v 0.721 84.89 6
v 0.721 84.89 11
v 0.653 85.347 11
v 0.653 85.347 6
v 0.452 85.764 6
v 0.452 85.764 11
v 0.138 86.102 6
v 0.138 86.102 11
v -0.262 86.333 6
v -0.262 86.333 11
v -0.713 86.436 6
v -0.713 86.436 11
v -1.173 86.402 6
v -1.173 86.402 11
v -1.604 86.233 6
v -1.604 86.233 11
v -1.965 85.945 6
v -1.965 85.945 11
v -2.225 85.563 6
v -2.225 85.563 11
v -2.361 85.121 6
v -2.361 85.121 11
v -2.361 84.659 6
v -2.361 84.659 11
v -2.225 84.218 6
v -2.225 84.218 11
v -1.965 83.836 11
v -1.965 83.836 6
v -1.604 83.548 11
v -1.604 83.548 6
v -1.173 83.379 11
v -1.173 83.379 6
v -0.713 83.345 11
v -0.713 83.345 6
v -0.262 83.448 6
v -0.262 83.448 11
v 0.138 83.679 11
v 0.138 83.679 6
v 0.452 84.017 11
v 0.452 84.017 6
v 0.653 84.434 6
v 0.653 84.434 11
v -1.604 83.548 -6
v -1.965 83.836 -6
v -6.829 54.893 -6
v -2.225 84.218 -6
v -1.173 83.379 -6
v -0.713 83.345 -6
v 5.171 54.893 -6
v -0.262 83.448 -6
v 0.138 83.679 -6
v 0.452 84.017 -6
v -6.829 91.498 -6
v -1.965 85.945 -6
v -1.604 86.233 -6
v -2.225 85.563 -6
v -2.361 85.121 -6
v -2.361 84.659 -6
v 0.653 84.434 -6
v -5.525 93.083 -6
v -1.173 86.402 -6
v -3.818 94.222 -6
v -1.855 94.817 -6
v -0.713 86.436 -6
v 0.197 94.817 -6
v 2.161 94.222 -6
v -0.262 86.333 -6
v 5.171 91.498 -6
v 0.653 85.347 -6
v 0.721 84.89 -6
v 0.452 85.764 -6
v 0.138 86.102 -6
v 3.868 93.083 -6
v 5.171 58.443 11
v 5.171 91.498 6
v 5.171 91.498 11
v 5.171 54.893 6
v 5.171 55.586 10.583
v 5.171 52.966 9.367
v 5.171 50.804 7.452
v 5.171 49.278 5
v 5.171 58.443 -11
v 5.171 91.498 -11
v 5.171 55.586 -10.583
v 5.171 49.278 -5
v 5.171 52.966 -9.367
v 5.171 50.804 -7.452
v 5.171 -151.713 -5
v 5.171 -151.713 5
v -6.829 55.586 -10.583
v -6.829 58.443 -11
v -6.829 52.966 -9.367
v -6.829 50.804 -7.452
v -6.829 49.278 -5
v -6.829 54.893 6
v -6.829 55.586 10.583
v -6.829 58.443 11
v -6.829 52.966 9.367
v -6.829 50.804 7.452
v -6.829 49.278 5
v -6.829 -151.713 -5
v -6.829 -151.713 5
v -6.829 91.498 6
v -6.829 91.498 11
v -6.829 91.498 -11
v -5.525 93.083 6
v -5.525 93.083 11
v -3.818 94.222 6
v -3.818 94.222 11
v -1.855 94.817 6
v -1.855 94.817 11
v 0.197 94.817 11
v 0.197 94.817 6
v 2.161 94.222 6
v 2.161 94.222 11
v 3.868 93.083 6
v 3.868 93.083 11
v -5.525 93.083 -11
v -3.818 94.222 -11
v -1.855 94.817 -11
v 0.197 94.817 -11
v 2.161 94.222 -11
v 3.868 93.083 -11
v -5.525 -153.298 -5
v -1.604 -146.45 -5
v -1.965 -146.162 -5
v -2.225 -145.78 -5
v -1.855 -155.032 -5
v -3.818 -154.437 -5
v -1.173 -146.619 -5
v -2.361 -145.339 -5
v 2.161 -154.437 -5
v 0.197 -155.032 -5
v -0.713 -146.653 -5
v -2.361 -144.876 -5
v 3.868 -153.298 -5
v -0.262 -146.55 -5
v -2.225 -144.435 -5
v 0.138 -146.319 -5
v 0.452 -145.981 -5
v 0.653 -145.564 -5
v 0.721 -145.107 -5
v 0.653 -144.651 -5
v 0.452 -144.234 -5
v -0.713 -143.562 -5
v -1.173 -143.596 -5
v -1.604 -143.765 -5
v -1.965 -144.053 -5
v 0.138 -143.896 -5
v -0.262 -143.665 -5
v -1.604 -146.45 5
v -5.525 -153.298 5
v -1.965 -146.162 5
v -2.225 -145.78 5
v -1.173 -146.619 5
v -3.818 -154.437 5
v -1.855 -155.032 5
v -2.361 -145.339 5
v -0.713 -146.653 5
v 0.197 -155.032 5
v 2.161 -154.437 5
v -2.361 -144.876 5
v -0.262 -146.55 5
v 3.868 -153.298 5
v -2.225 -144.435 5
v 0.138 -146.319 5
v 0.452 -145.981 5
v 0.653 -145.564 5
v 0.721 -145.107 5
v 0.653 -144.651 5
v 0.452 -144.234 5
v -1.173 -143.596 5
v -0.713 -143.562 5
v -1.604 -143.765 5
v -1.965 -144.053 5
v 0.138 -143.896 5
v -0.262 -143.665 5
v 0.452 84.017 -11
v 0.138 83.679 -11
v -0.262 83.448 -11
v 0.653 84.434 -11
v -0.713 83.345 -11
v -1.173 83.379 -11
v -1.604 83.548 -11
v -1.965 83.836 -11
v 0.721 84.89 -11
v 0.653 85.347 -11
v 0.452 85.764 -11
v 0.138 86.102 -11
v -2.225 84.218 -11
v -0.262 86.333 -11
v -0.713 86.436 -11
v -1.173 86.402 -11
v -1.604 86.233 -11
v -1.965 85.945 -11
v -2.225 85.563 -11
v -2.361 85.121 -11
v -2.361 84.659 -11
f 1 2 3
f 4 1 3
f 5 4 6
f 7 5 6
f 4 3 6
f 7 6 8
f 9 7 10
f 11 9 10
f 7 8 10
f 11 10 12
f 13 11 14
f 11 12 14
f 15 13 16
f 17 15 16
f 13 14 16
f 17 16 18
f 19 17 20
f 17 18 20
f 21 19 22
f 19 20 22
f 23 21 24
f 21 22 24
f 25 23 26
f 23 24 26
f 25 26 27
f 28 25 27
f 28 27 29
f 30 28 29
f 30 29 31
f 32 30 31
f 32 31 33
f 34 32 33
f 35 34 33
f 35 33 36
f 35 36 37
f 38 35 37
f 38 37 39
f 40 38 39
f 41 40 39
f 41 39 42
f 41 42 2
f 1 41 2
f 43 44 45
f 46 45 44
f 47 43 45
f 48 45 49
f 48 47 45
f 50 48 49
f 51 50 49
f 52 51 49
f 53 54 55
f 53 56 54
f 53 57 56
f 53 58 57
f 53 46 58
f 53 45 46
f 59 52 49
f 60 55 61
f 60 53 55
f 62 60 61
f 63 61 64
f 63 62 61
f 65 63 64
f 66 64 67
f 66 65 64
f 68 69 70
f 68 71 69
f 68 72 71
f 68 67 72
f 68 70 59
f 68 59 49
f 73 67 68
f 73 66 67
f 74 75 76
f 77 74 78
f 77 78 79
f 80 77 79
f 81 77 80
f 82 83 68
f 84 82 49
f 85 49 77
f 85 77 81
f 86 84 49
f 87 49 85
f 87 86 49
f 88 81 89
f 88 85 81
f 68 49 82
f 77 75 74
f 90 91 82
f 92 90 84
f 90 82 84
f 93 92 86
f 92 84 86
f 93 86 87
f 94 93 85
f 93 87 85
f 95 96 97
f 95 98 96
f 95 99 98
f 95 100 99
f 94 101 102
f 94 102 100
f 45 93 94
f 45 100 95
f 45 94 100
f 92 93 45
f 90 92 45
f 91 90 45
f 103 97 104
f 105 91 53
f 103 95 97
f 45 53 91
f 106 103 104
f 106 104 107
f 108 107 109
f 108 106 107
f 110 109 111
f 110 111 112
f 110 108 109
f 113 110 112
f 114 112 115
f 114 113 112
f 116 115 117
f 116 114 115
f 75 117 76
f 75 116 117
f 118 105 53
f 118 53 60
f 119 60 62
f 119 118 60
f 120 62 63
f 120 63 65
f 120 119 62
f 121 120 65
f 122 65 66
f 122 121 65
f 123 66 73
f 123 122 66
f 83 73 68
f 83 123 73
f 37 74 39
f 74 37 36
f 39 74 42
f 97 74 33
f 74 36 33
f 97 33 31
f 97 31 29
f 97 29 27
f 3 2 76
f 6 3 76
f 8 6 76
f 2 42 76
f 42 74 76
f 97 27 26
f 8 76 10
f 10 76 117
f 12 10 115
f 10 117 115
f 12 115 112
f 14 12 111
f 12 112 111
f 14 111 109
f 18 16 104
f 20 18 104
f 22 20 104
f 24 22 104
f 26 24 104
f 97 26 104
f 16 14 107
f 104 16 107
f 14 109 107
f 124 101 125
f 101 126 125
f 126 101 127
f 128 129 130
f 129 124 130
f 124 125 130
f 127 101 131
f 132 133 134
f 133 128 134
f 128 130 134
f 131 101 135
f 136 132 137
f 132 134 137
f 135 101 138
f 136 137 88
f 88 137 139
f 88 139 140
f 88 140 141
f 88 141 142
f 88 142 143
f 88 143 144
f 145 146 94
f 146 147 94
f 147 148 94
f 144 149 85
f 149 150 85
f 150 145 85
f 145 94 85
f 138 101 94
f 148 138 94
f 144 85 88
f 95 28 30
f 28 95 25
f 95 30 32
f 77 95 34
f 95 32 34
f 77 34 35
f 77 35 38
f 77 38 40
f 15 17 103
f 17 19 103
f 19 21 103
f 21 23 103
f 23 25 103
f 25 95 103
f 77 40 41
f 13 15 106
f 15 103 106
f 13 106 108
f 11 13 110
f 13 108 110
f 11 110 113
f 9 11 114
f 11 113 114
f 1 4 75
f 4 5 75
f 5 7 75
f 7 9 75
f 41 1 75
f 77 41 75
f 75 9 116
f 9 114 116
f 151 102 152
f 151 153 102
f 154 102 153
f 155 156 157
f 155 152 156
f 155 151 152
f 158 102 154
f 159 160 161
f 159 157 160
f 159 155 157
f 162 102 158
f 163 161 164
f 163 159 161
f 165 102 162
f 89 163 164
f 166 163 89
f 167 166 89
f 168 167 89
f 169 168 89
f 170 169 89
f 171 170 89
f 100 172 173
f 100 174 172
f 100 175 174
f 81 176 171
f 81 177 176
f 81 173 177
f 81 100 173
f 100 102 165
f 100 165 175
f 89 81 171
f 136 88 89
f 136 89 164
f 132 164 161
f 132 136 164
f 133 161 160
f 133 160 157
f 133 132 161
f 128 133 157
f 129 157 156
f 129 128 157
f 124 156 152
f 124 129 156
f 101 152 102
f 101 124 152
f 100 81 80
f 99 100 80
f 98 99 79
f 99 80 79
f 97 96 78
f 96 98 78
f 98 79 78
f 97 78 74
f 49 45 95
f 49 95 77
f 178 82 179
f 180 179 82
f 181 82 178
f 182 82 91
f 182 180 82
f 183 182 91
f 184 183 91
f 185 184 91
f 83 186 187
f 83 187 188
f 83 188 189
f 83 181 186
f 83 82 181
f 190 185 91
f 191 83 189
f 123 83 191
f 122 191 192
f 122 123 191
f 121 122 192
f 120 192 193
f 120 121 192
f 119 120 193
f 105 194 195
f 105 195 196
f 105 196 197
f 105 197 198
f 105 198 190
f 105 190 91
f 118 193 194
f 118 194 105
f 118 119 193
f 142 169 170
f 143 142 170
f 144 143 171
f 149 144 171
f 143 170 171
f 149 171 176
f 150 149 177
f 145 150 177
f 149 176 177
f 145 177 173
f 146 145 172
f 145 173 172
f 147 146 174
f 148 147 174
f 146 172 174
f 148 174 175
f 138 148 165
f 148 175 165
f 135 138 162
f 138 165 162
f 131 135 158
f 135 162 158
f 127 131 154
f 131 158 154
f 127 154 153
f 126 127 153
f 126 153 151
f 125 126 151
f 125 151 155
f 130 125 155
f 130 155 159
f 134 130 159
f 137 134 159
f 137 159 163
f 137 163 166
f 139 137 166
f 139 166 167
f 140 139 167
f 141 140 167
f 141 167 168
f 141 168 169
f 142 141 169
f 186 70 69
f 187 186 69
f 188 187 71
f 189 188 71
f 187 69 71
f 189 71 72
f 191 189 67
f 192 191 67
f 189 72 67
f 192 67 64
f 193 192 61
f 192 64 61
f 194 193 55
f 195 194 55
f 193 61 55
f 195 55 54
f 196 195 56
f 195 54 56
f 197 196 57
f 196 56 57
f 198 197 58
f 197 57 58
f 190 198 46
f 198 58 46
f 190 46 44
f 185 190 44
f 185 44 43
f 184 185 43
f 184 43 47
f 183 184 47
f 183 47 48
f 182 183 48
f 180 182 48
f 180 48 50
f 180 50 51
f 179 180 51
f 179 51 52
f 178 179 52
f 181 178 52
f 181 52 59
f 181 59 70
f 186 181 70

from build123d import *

# Parameters (mm, degrees)
BOSS_EXTRU_1_DEPTH      = 11
BOSS_EXTRU_1_DEPTH_BACK = 11
ESQUISSE3_W             = 16.581408451
ESQUISSE3_H             = 12
ENL_V_MAT_EXTRU_2_DEPTH = 40
CUT_EXTRUDE1_REACH      = 158.809
SKETCH1_R               = 1.55
CUT_EXTRUDE2_DEPTH      = 6
FILLET1_R               = 10


with BuildPart() as part:
    # Esquisse1 → Boss.-Extru.1 (new, two sides: drawn at the far end of the back side and taken through both)
    with BuildSketch(Plane.XY.offset(-BOSS_EXTRU_1_DEPTH_BACK)):
        with BuildLine():
            Line((-6.828531952, -151.713036206), (-6.828531952, 91.498065413))
            ThreePointArc((-6.828531952, 91.498065413), (-0.828532479, 94.89251507), (5.171468048, 91.498067278))
            Line((5.171468048, 91.498067278), (5.171468048, -151.713036206))
            ThreePointArc((5.171468048, -151.713036206), (-0.828531952, -155.10748493), (-6.828531952, -151.713036206))
        make_face()
    extrude(amount=BOSS_EXTRU_1_DEPTH + BOSS_EXTRU_1_DEPTH_BACK)

    # Esquisse3 → Enlèv. mat.-Extru.2 (cut)
    with BuildSketch(Plane(origin=(0, 94.89251507, 0), x_dir=(1, 0, 0), z_dir=(0, 1, 0))):
        with Locations((0.202032035, 0)):
            Rectangle(ESQUISSE3_W, ESQUISSE3_H)
    extrude(amount=-ENL_V_MAT_EXTRU_2_DEPTH, mode=Mode.SUBTRACT)

    # Cut-Extrude1: up to this face of the body (flat: up to its plane)
    cut_extrude1_end = Plane(part.part.faces().sort_by_distance((-0.828531947, -30.10748493, -11))[0])
    # Sketch1 → Cut-Extrude1 (cut, up to the picked face)
    with BuildSketch(Plane.XY.offset(11), mode=Mode.PRIVATE) as cut_extrude1_sk1:
        with Locations((-0.828531952, 84.890414662)):
            Circle(SKETCH1_R)
    cut_extrude1_tool1 = split(extrude(cut_extrude1_sk1.sketch, amount=-CUT_EXTRUDE1_REACH, mode=Mode.PRIVATE), bisect_by=cut_extrude1_end, keep=Keep.BOTH, mode=Mode.PRIVATE)
    # Sketch1 → Cut-Extrude1 (cut, up to the picked face)
    with BuildSketch(Plane.XY.offset(11), mode=Mode.PRIVATE) as cut_extrude1_sk2:
        with Locations((-0.828531952, -145.10748493)):
            Circle(SKETCH1_R)
    cut_extrude1_tool2 = split(extrude(cut_extrude1_sk2.sketch, amount=-CUT_EXTRUDE1_REACH, mode=Mode.PRIVATE), bisect_by=cut_extrude1_end, keep=Keep.BOTH, mode=Mode.PRIVATE)
    add(cut_extrude1_tool1.solids().sort_by(Axis((-0.828532, 84.890415, 11), (0, 0, -1)))[0], mode=Mode.SUBTRACT)
    add(cut_extrude1_tool2.solids().sort_by(Axis((-0.828532, -145.107485, 11), (0, 0, -1)))[0], mode=Mode.SUBTRACT)

    # Sketch4 → Cut-Extrude2 (cut)
    with BuildSketch(Plane.XY.offset(11)):
        with BuildLine():
            Line((-6.828531952, 49.278330566), (-6.828531952, -151.713036206))
            ThreePointArc((-6.828531952, -151.713036206), (-0.828531952, -157.713036206), (5.171468048, -151.713036206))
            Line((5.171468048, -151.713036206), (5.171468048, 49.278330566))
            Line((5.171468048, 49.278330566), (-6.828531952, 49.278330566))
        make_face()
    cut_extrude2 = extrude(amount=-CUT_EXTRUDE2_DEPTH, mode=Mode.SUBTRACT)

    # Mirror1: Cut-Extrude2 across plane
    add(cut_extrude2.mirror(Plane.XY), mode=Mode.SUBTRACT)

    # Fillet1
    # the kernel refuses this fillet: 10 mm, written as the material it takes off along each edge
    with BuildSketch(Plane(origin=(28.084346523, 49.278330566, -11), x_dir=(0, 1, 0), z_dir=(-1, 0, 0))) as fillet1_piece_1:
        with BuildLine():
            CenterArc((9.16515139, -10), FILLET1_R, 90, 66.421821522)
            Line((0, -6), (-0.183303028, -5.92))
            ThreePointArc((-0.183303028, -5.92), (-0.2, -3), (-0.2, 0))
            Line((-0.2, 0), (0, 0.2))
            Line((0, 0.2), (9.16515139, 0.2))
            Line((9.16515139, 0.2), (9.16515139, 0))
        make_face()
    extrude(amount=57.82575695, mode=Mode.SUBTRACT)
    with BuildSketch(Plane(origin=(28.084346523, 49.278330566, 11), x_dir=(0, 1, 0), z_dir=(-1, 0, 0))) as fillet1_piece_2:
        with BuildLine():
            CenterArc((9.16515139, 10), FILLET1_R, 203.578178478, 66.421821522)
            Line((0, 6), (-0.183303028, 5.92))
            ThreePointArc((-0.183303028, 5.92), (-0.2, 3), (-0.2, 0))
            Line((-0.2, 0), (0, -0.2))
            Line((0, -0.2), (9.16515139, -0.2))
            Line((9.16515139, -0.2), (9.16515139, 0))
        make_face()
    extrude(amount=57.82575695, mode=Mode.SUBTRACT)


solid = part.part
